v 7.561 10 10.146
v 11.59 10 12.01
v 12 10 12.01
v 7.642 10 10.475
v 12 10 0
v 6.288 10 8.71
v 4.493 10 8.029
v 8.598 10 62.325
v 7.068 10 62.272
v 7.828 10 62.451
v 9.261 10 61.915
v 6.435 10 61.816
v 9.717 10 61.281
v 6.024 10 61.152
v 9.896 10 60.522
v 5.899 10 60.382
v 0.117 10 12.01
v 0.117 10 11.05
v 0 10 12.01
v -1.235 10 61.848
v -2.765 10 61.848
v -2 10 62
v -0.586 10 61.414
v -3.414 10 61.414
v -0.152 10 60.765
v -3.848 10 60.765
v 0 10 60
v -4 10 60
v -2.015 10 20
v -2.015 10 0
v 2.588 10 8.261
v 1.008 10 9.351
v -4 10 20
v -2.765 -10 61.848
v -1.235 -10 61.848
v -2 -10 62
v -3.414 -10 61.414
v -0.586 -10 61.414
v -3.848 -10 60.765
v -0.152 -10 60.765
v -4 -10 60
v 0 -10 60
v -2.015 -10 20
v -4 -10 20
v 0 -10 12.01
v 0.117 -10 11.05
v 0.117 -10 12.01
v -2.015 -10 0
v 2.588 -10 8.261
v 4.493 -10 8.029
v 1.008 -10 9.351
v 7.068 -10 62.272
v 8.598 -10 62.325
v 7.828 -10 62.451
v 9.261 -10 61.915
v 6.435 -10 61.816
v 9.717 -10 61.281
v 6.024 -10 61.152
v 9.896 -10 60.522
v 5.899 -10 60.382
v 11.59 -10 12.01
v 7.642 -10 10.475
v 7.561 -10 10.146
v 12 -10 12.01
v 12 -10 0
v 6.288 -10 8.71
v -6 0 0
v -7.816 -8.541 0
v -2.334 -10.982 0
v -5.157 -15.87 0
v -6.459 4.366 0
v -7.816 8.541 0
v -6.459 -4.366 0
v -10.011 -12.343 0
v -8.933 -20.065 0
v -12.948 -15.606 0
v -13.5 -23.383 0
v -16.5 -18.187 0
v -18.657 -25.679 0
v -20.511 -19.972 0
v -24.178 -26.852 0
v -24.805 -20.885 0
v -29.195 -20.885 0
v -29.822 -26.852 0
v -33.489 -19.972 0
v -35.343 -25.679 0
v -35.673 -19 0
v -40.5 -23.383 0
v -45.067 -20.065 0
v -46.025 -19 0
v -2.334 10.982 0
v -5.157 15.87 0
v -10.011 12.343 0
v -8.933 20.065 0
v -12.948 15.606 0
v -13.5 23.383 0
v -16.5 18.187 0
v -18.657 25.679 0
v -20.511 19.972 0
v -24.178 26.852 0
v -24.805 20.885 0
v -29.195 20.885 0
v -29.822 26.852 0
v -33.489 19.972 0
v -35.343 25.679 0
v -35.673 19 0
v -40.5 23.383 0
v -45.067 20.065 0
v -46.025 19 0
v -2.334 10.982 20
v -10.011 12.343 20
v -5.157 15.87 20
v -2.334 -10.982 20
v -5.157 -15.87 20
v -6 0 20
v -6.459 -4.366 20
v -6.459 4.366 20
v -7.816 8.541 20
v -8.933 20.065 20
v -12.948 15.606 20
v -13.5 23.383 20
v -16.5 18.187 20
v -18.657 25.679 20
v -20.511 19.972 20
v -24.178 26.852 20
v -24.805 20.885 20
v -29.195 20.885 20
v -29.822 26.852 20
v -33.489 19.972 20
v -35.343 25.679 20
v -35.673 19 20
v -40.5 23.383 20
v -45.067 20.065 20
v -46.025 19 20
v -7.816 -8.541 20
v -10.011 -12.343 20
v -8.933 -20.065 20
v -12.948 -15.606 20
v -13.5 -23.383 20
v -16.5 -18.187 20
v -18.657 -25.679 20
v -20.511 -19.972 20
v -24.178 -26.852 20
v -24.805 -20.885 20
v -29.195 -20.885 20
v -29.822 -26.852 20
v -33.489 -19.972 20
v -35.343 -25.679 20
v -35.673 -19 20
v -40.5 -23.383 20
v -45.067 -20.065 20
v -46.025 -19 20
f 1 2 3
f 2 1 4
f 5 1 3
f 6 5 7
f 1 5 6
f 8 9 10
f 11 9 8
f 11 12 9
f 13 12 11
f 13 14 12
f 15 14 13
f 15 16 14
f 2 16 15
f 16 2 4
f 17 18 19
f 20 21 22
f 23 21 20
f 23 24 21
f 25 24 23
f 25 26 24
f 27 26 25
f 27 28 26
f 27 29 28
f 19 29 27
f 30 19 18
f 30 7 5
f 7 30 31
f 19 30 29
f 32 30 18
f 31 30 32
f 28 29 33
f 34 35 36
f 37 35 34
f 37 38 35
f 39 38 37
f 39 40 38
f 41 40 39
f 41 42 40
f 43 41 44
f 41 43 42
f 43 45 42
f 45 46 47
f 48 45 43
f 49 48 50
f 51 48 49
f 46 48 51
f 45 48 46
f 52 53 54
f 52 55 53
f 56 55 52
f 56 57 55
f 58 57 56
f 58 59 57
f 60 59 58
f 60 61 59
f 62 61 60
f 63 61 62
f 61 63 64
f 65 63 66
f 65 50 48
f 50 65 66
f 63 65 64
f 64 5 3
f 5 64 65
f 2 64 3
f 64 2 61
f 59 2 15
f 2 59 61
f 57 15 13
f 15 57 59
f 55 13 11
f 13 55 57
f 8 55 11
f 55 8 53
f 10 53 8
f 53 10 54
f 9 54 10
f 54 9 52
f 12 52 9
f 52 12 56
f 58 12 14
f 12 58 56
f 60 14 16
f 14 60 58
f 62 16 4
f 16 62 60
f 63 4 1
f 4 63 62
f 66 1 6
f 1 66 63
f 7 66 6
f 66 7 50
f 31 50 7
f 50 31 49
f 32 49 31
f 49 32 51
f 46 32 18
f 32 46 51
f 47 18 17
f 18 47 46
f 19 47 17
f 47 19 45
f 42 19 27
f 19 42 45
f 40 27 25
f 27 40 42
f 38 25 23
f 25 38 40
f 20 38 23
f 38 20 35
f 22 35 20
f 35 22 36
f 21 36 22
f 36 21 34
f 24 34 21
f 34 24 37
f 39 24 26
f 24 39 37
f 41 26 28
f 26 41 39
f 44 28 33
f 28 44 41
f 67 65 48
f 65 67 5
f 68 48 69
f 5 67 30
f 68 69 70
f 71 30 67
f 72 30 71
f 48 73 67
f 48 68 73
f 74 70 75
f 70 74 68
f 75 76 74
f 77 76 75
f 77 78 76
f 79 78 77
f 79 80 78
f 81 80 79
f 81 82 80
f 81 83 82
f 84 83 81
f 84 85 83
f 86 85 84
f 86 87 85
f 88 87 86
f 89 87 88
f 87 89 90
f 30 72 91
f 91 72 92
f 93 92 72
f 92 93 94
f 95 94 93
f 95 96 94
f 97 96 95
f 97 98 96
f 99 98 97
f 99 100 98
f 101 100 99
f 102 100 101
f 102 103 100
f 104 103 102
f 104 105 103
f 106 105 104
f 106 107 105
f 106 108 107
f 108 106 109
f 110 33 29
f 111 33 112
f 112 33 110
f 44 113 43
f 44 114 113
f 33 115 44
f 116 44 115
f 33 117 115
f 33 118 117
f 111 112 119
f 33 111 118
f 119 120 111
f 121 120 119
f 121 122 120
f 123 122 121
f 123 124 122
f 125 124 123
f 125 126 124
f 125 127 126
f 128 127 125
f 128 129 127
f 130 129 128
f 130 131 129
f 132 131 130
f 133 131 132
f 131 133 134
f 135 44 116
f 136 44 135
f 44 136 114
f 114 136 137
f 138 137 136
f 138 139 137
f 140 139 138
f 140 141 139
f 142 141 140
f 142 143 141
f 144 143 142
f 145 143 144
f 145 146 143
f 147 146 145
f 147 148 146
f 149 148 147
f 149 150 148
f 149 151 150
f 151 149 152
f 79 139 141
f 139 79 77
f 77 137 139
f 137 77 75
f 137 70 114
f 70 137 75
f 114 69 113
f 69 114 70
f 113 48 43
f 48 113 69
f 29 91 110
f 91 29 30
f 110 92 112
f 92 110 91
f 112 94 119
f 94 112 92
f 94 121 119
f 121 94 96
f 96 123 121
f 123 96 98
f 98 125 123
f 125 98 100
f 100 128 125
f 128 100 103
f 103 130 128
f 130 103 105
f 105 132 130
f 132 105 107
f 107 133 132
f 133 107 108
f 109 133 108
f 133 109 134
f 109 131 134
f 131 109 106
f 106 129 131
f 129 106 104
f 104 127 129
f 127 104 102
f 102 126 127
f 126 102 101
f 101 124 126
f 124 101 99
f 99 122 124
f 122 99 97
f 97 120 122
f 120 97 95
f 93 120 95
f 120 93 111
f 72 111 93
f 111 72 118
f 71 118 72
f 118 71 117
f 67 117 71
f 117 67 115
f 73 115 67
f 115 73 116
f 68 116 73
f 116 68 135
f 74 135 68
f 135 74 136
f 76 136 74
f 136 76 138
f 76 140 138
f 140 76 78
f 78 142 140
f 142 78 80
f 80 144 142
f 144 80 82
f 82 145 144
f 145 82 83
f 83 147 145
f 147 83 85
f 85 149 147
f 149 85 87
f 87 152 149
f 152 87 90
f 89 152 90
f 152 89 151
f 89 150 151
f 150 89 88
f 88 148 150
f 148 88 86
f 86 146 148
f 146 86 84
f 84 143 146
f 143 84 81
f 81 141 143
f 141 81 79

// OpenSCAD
item_diameter=42;

/* [Grip] */
grip_thickness = 6;
grip_height=20;
grip_gap=38;

/* [Clip] */
clip_height=60;
clip_gap=8;
clip_thickness=4;


/* [Hidden] */
fudge = 0.01;

color([1,0,0]) clip();
color([0,1,0]) grip();

module clip(){
  // Cmd-8 for side-view
  width=20;
  top_thickness = clip_thickness + 4;

  translate([-clip_thickness, width/2, 0])
    rotate(a=90, v=[1, 0, 0])
    linear_extrude(height=width){
      // joint side
      square([clip_thickness, clip_height]);

      // joint side bottom nub
      translate([clip_thickness/2, clip_height])
        circle(r=clip_thickness/2, $fn=16);

      // body side
      body_side_height = clip_height - top_thickness;
      rotate(2)
        translate([clip_thickness + clip_gap, 0]){
          translate([0, top_thickness])
            #square([clip_thickness, body_side_height]);

            //body side bottom nub
            translate([clip_thickness/2, clip_height])
            circle(r=clip_thickness/2, $fn=16);
        }


      top_curve_r = clip_gap / 2 + fudge;
      // "top" bridge
      difference(){
        color([0,1,0])
          square([clip_thickness + clip_gap + clip_thickness, top_thickness + top_curve_r]);

        color([1,0,0])
          translate([clip_thickness + top_curve_r, top_thickness + top_curve_r])
          circle(r=top_curve_r);
      }

    }
}

module grip(){
// Cmd-4 for top-view
item_r = item_diameter / 2;
outer_r = item_r + grip_thickness;
    


translate([-outer_r,0])
linear_extrude(height=grip_height){
    
    difference(){
        //outer
        circle(r=outer_r);
        //inner (hole)
        circle(r=item_r);

        //grip_gap
        translate([-item_r,0])
        square([item_diameter, grip_gap], center=true);

    }
}

}
